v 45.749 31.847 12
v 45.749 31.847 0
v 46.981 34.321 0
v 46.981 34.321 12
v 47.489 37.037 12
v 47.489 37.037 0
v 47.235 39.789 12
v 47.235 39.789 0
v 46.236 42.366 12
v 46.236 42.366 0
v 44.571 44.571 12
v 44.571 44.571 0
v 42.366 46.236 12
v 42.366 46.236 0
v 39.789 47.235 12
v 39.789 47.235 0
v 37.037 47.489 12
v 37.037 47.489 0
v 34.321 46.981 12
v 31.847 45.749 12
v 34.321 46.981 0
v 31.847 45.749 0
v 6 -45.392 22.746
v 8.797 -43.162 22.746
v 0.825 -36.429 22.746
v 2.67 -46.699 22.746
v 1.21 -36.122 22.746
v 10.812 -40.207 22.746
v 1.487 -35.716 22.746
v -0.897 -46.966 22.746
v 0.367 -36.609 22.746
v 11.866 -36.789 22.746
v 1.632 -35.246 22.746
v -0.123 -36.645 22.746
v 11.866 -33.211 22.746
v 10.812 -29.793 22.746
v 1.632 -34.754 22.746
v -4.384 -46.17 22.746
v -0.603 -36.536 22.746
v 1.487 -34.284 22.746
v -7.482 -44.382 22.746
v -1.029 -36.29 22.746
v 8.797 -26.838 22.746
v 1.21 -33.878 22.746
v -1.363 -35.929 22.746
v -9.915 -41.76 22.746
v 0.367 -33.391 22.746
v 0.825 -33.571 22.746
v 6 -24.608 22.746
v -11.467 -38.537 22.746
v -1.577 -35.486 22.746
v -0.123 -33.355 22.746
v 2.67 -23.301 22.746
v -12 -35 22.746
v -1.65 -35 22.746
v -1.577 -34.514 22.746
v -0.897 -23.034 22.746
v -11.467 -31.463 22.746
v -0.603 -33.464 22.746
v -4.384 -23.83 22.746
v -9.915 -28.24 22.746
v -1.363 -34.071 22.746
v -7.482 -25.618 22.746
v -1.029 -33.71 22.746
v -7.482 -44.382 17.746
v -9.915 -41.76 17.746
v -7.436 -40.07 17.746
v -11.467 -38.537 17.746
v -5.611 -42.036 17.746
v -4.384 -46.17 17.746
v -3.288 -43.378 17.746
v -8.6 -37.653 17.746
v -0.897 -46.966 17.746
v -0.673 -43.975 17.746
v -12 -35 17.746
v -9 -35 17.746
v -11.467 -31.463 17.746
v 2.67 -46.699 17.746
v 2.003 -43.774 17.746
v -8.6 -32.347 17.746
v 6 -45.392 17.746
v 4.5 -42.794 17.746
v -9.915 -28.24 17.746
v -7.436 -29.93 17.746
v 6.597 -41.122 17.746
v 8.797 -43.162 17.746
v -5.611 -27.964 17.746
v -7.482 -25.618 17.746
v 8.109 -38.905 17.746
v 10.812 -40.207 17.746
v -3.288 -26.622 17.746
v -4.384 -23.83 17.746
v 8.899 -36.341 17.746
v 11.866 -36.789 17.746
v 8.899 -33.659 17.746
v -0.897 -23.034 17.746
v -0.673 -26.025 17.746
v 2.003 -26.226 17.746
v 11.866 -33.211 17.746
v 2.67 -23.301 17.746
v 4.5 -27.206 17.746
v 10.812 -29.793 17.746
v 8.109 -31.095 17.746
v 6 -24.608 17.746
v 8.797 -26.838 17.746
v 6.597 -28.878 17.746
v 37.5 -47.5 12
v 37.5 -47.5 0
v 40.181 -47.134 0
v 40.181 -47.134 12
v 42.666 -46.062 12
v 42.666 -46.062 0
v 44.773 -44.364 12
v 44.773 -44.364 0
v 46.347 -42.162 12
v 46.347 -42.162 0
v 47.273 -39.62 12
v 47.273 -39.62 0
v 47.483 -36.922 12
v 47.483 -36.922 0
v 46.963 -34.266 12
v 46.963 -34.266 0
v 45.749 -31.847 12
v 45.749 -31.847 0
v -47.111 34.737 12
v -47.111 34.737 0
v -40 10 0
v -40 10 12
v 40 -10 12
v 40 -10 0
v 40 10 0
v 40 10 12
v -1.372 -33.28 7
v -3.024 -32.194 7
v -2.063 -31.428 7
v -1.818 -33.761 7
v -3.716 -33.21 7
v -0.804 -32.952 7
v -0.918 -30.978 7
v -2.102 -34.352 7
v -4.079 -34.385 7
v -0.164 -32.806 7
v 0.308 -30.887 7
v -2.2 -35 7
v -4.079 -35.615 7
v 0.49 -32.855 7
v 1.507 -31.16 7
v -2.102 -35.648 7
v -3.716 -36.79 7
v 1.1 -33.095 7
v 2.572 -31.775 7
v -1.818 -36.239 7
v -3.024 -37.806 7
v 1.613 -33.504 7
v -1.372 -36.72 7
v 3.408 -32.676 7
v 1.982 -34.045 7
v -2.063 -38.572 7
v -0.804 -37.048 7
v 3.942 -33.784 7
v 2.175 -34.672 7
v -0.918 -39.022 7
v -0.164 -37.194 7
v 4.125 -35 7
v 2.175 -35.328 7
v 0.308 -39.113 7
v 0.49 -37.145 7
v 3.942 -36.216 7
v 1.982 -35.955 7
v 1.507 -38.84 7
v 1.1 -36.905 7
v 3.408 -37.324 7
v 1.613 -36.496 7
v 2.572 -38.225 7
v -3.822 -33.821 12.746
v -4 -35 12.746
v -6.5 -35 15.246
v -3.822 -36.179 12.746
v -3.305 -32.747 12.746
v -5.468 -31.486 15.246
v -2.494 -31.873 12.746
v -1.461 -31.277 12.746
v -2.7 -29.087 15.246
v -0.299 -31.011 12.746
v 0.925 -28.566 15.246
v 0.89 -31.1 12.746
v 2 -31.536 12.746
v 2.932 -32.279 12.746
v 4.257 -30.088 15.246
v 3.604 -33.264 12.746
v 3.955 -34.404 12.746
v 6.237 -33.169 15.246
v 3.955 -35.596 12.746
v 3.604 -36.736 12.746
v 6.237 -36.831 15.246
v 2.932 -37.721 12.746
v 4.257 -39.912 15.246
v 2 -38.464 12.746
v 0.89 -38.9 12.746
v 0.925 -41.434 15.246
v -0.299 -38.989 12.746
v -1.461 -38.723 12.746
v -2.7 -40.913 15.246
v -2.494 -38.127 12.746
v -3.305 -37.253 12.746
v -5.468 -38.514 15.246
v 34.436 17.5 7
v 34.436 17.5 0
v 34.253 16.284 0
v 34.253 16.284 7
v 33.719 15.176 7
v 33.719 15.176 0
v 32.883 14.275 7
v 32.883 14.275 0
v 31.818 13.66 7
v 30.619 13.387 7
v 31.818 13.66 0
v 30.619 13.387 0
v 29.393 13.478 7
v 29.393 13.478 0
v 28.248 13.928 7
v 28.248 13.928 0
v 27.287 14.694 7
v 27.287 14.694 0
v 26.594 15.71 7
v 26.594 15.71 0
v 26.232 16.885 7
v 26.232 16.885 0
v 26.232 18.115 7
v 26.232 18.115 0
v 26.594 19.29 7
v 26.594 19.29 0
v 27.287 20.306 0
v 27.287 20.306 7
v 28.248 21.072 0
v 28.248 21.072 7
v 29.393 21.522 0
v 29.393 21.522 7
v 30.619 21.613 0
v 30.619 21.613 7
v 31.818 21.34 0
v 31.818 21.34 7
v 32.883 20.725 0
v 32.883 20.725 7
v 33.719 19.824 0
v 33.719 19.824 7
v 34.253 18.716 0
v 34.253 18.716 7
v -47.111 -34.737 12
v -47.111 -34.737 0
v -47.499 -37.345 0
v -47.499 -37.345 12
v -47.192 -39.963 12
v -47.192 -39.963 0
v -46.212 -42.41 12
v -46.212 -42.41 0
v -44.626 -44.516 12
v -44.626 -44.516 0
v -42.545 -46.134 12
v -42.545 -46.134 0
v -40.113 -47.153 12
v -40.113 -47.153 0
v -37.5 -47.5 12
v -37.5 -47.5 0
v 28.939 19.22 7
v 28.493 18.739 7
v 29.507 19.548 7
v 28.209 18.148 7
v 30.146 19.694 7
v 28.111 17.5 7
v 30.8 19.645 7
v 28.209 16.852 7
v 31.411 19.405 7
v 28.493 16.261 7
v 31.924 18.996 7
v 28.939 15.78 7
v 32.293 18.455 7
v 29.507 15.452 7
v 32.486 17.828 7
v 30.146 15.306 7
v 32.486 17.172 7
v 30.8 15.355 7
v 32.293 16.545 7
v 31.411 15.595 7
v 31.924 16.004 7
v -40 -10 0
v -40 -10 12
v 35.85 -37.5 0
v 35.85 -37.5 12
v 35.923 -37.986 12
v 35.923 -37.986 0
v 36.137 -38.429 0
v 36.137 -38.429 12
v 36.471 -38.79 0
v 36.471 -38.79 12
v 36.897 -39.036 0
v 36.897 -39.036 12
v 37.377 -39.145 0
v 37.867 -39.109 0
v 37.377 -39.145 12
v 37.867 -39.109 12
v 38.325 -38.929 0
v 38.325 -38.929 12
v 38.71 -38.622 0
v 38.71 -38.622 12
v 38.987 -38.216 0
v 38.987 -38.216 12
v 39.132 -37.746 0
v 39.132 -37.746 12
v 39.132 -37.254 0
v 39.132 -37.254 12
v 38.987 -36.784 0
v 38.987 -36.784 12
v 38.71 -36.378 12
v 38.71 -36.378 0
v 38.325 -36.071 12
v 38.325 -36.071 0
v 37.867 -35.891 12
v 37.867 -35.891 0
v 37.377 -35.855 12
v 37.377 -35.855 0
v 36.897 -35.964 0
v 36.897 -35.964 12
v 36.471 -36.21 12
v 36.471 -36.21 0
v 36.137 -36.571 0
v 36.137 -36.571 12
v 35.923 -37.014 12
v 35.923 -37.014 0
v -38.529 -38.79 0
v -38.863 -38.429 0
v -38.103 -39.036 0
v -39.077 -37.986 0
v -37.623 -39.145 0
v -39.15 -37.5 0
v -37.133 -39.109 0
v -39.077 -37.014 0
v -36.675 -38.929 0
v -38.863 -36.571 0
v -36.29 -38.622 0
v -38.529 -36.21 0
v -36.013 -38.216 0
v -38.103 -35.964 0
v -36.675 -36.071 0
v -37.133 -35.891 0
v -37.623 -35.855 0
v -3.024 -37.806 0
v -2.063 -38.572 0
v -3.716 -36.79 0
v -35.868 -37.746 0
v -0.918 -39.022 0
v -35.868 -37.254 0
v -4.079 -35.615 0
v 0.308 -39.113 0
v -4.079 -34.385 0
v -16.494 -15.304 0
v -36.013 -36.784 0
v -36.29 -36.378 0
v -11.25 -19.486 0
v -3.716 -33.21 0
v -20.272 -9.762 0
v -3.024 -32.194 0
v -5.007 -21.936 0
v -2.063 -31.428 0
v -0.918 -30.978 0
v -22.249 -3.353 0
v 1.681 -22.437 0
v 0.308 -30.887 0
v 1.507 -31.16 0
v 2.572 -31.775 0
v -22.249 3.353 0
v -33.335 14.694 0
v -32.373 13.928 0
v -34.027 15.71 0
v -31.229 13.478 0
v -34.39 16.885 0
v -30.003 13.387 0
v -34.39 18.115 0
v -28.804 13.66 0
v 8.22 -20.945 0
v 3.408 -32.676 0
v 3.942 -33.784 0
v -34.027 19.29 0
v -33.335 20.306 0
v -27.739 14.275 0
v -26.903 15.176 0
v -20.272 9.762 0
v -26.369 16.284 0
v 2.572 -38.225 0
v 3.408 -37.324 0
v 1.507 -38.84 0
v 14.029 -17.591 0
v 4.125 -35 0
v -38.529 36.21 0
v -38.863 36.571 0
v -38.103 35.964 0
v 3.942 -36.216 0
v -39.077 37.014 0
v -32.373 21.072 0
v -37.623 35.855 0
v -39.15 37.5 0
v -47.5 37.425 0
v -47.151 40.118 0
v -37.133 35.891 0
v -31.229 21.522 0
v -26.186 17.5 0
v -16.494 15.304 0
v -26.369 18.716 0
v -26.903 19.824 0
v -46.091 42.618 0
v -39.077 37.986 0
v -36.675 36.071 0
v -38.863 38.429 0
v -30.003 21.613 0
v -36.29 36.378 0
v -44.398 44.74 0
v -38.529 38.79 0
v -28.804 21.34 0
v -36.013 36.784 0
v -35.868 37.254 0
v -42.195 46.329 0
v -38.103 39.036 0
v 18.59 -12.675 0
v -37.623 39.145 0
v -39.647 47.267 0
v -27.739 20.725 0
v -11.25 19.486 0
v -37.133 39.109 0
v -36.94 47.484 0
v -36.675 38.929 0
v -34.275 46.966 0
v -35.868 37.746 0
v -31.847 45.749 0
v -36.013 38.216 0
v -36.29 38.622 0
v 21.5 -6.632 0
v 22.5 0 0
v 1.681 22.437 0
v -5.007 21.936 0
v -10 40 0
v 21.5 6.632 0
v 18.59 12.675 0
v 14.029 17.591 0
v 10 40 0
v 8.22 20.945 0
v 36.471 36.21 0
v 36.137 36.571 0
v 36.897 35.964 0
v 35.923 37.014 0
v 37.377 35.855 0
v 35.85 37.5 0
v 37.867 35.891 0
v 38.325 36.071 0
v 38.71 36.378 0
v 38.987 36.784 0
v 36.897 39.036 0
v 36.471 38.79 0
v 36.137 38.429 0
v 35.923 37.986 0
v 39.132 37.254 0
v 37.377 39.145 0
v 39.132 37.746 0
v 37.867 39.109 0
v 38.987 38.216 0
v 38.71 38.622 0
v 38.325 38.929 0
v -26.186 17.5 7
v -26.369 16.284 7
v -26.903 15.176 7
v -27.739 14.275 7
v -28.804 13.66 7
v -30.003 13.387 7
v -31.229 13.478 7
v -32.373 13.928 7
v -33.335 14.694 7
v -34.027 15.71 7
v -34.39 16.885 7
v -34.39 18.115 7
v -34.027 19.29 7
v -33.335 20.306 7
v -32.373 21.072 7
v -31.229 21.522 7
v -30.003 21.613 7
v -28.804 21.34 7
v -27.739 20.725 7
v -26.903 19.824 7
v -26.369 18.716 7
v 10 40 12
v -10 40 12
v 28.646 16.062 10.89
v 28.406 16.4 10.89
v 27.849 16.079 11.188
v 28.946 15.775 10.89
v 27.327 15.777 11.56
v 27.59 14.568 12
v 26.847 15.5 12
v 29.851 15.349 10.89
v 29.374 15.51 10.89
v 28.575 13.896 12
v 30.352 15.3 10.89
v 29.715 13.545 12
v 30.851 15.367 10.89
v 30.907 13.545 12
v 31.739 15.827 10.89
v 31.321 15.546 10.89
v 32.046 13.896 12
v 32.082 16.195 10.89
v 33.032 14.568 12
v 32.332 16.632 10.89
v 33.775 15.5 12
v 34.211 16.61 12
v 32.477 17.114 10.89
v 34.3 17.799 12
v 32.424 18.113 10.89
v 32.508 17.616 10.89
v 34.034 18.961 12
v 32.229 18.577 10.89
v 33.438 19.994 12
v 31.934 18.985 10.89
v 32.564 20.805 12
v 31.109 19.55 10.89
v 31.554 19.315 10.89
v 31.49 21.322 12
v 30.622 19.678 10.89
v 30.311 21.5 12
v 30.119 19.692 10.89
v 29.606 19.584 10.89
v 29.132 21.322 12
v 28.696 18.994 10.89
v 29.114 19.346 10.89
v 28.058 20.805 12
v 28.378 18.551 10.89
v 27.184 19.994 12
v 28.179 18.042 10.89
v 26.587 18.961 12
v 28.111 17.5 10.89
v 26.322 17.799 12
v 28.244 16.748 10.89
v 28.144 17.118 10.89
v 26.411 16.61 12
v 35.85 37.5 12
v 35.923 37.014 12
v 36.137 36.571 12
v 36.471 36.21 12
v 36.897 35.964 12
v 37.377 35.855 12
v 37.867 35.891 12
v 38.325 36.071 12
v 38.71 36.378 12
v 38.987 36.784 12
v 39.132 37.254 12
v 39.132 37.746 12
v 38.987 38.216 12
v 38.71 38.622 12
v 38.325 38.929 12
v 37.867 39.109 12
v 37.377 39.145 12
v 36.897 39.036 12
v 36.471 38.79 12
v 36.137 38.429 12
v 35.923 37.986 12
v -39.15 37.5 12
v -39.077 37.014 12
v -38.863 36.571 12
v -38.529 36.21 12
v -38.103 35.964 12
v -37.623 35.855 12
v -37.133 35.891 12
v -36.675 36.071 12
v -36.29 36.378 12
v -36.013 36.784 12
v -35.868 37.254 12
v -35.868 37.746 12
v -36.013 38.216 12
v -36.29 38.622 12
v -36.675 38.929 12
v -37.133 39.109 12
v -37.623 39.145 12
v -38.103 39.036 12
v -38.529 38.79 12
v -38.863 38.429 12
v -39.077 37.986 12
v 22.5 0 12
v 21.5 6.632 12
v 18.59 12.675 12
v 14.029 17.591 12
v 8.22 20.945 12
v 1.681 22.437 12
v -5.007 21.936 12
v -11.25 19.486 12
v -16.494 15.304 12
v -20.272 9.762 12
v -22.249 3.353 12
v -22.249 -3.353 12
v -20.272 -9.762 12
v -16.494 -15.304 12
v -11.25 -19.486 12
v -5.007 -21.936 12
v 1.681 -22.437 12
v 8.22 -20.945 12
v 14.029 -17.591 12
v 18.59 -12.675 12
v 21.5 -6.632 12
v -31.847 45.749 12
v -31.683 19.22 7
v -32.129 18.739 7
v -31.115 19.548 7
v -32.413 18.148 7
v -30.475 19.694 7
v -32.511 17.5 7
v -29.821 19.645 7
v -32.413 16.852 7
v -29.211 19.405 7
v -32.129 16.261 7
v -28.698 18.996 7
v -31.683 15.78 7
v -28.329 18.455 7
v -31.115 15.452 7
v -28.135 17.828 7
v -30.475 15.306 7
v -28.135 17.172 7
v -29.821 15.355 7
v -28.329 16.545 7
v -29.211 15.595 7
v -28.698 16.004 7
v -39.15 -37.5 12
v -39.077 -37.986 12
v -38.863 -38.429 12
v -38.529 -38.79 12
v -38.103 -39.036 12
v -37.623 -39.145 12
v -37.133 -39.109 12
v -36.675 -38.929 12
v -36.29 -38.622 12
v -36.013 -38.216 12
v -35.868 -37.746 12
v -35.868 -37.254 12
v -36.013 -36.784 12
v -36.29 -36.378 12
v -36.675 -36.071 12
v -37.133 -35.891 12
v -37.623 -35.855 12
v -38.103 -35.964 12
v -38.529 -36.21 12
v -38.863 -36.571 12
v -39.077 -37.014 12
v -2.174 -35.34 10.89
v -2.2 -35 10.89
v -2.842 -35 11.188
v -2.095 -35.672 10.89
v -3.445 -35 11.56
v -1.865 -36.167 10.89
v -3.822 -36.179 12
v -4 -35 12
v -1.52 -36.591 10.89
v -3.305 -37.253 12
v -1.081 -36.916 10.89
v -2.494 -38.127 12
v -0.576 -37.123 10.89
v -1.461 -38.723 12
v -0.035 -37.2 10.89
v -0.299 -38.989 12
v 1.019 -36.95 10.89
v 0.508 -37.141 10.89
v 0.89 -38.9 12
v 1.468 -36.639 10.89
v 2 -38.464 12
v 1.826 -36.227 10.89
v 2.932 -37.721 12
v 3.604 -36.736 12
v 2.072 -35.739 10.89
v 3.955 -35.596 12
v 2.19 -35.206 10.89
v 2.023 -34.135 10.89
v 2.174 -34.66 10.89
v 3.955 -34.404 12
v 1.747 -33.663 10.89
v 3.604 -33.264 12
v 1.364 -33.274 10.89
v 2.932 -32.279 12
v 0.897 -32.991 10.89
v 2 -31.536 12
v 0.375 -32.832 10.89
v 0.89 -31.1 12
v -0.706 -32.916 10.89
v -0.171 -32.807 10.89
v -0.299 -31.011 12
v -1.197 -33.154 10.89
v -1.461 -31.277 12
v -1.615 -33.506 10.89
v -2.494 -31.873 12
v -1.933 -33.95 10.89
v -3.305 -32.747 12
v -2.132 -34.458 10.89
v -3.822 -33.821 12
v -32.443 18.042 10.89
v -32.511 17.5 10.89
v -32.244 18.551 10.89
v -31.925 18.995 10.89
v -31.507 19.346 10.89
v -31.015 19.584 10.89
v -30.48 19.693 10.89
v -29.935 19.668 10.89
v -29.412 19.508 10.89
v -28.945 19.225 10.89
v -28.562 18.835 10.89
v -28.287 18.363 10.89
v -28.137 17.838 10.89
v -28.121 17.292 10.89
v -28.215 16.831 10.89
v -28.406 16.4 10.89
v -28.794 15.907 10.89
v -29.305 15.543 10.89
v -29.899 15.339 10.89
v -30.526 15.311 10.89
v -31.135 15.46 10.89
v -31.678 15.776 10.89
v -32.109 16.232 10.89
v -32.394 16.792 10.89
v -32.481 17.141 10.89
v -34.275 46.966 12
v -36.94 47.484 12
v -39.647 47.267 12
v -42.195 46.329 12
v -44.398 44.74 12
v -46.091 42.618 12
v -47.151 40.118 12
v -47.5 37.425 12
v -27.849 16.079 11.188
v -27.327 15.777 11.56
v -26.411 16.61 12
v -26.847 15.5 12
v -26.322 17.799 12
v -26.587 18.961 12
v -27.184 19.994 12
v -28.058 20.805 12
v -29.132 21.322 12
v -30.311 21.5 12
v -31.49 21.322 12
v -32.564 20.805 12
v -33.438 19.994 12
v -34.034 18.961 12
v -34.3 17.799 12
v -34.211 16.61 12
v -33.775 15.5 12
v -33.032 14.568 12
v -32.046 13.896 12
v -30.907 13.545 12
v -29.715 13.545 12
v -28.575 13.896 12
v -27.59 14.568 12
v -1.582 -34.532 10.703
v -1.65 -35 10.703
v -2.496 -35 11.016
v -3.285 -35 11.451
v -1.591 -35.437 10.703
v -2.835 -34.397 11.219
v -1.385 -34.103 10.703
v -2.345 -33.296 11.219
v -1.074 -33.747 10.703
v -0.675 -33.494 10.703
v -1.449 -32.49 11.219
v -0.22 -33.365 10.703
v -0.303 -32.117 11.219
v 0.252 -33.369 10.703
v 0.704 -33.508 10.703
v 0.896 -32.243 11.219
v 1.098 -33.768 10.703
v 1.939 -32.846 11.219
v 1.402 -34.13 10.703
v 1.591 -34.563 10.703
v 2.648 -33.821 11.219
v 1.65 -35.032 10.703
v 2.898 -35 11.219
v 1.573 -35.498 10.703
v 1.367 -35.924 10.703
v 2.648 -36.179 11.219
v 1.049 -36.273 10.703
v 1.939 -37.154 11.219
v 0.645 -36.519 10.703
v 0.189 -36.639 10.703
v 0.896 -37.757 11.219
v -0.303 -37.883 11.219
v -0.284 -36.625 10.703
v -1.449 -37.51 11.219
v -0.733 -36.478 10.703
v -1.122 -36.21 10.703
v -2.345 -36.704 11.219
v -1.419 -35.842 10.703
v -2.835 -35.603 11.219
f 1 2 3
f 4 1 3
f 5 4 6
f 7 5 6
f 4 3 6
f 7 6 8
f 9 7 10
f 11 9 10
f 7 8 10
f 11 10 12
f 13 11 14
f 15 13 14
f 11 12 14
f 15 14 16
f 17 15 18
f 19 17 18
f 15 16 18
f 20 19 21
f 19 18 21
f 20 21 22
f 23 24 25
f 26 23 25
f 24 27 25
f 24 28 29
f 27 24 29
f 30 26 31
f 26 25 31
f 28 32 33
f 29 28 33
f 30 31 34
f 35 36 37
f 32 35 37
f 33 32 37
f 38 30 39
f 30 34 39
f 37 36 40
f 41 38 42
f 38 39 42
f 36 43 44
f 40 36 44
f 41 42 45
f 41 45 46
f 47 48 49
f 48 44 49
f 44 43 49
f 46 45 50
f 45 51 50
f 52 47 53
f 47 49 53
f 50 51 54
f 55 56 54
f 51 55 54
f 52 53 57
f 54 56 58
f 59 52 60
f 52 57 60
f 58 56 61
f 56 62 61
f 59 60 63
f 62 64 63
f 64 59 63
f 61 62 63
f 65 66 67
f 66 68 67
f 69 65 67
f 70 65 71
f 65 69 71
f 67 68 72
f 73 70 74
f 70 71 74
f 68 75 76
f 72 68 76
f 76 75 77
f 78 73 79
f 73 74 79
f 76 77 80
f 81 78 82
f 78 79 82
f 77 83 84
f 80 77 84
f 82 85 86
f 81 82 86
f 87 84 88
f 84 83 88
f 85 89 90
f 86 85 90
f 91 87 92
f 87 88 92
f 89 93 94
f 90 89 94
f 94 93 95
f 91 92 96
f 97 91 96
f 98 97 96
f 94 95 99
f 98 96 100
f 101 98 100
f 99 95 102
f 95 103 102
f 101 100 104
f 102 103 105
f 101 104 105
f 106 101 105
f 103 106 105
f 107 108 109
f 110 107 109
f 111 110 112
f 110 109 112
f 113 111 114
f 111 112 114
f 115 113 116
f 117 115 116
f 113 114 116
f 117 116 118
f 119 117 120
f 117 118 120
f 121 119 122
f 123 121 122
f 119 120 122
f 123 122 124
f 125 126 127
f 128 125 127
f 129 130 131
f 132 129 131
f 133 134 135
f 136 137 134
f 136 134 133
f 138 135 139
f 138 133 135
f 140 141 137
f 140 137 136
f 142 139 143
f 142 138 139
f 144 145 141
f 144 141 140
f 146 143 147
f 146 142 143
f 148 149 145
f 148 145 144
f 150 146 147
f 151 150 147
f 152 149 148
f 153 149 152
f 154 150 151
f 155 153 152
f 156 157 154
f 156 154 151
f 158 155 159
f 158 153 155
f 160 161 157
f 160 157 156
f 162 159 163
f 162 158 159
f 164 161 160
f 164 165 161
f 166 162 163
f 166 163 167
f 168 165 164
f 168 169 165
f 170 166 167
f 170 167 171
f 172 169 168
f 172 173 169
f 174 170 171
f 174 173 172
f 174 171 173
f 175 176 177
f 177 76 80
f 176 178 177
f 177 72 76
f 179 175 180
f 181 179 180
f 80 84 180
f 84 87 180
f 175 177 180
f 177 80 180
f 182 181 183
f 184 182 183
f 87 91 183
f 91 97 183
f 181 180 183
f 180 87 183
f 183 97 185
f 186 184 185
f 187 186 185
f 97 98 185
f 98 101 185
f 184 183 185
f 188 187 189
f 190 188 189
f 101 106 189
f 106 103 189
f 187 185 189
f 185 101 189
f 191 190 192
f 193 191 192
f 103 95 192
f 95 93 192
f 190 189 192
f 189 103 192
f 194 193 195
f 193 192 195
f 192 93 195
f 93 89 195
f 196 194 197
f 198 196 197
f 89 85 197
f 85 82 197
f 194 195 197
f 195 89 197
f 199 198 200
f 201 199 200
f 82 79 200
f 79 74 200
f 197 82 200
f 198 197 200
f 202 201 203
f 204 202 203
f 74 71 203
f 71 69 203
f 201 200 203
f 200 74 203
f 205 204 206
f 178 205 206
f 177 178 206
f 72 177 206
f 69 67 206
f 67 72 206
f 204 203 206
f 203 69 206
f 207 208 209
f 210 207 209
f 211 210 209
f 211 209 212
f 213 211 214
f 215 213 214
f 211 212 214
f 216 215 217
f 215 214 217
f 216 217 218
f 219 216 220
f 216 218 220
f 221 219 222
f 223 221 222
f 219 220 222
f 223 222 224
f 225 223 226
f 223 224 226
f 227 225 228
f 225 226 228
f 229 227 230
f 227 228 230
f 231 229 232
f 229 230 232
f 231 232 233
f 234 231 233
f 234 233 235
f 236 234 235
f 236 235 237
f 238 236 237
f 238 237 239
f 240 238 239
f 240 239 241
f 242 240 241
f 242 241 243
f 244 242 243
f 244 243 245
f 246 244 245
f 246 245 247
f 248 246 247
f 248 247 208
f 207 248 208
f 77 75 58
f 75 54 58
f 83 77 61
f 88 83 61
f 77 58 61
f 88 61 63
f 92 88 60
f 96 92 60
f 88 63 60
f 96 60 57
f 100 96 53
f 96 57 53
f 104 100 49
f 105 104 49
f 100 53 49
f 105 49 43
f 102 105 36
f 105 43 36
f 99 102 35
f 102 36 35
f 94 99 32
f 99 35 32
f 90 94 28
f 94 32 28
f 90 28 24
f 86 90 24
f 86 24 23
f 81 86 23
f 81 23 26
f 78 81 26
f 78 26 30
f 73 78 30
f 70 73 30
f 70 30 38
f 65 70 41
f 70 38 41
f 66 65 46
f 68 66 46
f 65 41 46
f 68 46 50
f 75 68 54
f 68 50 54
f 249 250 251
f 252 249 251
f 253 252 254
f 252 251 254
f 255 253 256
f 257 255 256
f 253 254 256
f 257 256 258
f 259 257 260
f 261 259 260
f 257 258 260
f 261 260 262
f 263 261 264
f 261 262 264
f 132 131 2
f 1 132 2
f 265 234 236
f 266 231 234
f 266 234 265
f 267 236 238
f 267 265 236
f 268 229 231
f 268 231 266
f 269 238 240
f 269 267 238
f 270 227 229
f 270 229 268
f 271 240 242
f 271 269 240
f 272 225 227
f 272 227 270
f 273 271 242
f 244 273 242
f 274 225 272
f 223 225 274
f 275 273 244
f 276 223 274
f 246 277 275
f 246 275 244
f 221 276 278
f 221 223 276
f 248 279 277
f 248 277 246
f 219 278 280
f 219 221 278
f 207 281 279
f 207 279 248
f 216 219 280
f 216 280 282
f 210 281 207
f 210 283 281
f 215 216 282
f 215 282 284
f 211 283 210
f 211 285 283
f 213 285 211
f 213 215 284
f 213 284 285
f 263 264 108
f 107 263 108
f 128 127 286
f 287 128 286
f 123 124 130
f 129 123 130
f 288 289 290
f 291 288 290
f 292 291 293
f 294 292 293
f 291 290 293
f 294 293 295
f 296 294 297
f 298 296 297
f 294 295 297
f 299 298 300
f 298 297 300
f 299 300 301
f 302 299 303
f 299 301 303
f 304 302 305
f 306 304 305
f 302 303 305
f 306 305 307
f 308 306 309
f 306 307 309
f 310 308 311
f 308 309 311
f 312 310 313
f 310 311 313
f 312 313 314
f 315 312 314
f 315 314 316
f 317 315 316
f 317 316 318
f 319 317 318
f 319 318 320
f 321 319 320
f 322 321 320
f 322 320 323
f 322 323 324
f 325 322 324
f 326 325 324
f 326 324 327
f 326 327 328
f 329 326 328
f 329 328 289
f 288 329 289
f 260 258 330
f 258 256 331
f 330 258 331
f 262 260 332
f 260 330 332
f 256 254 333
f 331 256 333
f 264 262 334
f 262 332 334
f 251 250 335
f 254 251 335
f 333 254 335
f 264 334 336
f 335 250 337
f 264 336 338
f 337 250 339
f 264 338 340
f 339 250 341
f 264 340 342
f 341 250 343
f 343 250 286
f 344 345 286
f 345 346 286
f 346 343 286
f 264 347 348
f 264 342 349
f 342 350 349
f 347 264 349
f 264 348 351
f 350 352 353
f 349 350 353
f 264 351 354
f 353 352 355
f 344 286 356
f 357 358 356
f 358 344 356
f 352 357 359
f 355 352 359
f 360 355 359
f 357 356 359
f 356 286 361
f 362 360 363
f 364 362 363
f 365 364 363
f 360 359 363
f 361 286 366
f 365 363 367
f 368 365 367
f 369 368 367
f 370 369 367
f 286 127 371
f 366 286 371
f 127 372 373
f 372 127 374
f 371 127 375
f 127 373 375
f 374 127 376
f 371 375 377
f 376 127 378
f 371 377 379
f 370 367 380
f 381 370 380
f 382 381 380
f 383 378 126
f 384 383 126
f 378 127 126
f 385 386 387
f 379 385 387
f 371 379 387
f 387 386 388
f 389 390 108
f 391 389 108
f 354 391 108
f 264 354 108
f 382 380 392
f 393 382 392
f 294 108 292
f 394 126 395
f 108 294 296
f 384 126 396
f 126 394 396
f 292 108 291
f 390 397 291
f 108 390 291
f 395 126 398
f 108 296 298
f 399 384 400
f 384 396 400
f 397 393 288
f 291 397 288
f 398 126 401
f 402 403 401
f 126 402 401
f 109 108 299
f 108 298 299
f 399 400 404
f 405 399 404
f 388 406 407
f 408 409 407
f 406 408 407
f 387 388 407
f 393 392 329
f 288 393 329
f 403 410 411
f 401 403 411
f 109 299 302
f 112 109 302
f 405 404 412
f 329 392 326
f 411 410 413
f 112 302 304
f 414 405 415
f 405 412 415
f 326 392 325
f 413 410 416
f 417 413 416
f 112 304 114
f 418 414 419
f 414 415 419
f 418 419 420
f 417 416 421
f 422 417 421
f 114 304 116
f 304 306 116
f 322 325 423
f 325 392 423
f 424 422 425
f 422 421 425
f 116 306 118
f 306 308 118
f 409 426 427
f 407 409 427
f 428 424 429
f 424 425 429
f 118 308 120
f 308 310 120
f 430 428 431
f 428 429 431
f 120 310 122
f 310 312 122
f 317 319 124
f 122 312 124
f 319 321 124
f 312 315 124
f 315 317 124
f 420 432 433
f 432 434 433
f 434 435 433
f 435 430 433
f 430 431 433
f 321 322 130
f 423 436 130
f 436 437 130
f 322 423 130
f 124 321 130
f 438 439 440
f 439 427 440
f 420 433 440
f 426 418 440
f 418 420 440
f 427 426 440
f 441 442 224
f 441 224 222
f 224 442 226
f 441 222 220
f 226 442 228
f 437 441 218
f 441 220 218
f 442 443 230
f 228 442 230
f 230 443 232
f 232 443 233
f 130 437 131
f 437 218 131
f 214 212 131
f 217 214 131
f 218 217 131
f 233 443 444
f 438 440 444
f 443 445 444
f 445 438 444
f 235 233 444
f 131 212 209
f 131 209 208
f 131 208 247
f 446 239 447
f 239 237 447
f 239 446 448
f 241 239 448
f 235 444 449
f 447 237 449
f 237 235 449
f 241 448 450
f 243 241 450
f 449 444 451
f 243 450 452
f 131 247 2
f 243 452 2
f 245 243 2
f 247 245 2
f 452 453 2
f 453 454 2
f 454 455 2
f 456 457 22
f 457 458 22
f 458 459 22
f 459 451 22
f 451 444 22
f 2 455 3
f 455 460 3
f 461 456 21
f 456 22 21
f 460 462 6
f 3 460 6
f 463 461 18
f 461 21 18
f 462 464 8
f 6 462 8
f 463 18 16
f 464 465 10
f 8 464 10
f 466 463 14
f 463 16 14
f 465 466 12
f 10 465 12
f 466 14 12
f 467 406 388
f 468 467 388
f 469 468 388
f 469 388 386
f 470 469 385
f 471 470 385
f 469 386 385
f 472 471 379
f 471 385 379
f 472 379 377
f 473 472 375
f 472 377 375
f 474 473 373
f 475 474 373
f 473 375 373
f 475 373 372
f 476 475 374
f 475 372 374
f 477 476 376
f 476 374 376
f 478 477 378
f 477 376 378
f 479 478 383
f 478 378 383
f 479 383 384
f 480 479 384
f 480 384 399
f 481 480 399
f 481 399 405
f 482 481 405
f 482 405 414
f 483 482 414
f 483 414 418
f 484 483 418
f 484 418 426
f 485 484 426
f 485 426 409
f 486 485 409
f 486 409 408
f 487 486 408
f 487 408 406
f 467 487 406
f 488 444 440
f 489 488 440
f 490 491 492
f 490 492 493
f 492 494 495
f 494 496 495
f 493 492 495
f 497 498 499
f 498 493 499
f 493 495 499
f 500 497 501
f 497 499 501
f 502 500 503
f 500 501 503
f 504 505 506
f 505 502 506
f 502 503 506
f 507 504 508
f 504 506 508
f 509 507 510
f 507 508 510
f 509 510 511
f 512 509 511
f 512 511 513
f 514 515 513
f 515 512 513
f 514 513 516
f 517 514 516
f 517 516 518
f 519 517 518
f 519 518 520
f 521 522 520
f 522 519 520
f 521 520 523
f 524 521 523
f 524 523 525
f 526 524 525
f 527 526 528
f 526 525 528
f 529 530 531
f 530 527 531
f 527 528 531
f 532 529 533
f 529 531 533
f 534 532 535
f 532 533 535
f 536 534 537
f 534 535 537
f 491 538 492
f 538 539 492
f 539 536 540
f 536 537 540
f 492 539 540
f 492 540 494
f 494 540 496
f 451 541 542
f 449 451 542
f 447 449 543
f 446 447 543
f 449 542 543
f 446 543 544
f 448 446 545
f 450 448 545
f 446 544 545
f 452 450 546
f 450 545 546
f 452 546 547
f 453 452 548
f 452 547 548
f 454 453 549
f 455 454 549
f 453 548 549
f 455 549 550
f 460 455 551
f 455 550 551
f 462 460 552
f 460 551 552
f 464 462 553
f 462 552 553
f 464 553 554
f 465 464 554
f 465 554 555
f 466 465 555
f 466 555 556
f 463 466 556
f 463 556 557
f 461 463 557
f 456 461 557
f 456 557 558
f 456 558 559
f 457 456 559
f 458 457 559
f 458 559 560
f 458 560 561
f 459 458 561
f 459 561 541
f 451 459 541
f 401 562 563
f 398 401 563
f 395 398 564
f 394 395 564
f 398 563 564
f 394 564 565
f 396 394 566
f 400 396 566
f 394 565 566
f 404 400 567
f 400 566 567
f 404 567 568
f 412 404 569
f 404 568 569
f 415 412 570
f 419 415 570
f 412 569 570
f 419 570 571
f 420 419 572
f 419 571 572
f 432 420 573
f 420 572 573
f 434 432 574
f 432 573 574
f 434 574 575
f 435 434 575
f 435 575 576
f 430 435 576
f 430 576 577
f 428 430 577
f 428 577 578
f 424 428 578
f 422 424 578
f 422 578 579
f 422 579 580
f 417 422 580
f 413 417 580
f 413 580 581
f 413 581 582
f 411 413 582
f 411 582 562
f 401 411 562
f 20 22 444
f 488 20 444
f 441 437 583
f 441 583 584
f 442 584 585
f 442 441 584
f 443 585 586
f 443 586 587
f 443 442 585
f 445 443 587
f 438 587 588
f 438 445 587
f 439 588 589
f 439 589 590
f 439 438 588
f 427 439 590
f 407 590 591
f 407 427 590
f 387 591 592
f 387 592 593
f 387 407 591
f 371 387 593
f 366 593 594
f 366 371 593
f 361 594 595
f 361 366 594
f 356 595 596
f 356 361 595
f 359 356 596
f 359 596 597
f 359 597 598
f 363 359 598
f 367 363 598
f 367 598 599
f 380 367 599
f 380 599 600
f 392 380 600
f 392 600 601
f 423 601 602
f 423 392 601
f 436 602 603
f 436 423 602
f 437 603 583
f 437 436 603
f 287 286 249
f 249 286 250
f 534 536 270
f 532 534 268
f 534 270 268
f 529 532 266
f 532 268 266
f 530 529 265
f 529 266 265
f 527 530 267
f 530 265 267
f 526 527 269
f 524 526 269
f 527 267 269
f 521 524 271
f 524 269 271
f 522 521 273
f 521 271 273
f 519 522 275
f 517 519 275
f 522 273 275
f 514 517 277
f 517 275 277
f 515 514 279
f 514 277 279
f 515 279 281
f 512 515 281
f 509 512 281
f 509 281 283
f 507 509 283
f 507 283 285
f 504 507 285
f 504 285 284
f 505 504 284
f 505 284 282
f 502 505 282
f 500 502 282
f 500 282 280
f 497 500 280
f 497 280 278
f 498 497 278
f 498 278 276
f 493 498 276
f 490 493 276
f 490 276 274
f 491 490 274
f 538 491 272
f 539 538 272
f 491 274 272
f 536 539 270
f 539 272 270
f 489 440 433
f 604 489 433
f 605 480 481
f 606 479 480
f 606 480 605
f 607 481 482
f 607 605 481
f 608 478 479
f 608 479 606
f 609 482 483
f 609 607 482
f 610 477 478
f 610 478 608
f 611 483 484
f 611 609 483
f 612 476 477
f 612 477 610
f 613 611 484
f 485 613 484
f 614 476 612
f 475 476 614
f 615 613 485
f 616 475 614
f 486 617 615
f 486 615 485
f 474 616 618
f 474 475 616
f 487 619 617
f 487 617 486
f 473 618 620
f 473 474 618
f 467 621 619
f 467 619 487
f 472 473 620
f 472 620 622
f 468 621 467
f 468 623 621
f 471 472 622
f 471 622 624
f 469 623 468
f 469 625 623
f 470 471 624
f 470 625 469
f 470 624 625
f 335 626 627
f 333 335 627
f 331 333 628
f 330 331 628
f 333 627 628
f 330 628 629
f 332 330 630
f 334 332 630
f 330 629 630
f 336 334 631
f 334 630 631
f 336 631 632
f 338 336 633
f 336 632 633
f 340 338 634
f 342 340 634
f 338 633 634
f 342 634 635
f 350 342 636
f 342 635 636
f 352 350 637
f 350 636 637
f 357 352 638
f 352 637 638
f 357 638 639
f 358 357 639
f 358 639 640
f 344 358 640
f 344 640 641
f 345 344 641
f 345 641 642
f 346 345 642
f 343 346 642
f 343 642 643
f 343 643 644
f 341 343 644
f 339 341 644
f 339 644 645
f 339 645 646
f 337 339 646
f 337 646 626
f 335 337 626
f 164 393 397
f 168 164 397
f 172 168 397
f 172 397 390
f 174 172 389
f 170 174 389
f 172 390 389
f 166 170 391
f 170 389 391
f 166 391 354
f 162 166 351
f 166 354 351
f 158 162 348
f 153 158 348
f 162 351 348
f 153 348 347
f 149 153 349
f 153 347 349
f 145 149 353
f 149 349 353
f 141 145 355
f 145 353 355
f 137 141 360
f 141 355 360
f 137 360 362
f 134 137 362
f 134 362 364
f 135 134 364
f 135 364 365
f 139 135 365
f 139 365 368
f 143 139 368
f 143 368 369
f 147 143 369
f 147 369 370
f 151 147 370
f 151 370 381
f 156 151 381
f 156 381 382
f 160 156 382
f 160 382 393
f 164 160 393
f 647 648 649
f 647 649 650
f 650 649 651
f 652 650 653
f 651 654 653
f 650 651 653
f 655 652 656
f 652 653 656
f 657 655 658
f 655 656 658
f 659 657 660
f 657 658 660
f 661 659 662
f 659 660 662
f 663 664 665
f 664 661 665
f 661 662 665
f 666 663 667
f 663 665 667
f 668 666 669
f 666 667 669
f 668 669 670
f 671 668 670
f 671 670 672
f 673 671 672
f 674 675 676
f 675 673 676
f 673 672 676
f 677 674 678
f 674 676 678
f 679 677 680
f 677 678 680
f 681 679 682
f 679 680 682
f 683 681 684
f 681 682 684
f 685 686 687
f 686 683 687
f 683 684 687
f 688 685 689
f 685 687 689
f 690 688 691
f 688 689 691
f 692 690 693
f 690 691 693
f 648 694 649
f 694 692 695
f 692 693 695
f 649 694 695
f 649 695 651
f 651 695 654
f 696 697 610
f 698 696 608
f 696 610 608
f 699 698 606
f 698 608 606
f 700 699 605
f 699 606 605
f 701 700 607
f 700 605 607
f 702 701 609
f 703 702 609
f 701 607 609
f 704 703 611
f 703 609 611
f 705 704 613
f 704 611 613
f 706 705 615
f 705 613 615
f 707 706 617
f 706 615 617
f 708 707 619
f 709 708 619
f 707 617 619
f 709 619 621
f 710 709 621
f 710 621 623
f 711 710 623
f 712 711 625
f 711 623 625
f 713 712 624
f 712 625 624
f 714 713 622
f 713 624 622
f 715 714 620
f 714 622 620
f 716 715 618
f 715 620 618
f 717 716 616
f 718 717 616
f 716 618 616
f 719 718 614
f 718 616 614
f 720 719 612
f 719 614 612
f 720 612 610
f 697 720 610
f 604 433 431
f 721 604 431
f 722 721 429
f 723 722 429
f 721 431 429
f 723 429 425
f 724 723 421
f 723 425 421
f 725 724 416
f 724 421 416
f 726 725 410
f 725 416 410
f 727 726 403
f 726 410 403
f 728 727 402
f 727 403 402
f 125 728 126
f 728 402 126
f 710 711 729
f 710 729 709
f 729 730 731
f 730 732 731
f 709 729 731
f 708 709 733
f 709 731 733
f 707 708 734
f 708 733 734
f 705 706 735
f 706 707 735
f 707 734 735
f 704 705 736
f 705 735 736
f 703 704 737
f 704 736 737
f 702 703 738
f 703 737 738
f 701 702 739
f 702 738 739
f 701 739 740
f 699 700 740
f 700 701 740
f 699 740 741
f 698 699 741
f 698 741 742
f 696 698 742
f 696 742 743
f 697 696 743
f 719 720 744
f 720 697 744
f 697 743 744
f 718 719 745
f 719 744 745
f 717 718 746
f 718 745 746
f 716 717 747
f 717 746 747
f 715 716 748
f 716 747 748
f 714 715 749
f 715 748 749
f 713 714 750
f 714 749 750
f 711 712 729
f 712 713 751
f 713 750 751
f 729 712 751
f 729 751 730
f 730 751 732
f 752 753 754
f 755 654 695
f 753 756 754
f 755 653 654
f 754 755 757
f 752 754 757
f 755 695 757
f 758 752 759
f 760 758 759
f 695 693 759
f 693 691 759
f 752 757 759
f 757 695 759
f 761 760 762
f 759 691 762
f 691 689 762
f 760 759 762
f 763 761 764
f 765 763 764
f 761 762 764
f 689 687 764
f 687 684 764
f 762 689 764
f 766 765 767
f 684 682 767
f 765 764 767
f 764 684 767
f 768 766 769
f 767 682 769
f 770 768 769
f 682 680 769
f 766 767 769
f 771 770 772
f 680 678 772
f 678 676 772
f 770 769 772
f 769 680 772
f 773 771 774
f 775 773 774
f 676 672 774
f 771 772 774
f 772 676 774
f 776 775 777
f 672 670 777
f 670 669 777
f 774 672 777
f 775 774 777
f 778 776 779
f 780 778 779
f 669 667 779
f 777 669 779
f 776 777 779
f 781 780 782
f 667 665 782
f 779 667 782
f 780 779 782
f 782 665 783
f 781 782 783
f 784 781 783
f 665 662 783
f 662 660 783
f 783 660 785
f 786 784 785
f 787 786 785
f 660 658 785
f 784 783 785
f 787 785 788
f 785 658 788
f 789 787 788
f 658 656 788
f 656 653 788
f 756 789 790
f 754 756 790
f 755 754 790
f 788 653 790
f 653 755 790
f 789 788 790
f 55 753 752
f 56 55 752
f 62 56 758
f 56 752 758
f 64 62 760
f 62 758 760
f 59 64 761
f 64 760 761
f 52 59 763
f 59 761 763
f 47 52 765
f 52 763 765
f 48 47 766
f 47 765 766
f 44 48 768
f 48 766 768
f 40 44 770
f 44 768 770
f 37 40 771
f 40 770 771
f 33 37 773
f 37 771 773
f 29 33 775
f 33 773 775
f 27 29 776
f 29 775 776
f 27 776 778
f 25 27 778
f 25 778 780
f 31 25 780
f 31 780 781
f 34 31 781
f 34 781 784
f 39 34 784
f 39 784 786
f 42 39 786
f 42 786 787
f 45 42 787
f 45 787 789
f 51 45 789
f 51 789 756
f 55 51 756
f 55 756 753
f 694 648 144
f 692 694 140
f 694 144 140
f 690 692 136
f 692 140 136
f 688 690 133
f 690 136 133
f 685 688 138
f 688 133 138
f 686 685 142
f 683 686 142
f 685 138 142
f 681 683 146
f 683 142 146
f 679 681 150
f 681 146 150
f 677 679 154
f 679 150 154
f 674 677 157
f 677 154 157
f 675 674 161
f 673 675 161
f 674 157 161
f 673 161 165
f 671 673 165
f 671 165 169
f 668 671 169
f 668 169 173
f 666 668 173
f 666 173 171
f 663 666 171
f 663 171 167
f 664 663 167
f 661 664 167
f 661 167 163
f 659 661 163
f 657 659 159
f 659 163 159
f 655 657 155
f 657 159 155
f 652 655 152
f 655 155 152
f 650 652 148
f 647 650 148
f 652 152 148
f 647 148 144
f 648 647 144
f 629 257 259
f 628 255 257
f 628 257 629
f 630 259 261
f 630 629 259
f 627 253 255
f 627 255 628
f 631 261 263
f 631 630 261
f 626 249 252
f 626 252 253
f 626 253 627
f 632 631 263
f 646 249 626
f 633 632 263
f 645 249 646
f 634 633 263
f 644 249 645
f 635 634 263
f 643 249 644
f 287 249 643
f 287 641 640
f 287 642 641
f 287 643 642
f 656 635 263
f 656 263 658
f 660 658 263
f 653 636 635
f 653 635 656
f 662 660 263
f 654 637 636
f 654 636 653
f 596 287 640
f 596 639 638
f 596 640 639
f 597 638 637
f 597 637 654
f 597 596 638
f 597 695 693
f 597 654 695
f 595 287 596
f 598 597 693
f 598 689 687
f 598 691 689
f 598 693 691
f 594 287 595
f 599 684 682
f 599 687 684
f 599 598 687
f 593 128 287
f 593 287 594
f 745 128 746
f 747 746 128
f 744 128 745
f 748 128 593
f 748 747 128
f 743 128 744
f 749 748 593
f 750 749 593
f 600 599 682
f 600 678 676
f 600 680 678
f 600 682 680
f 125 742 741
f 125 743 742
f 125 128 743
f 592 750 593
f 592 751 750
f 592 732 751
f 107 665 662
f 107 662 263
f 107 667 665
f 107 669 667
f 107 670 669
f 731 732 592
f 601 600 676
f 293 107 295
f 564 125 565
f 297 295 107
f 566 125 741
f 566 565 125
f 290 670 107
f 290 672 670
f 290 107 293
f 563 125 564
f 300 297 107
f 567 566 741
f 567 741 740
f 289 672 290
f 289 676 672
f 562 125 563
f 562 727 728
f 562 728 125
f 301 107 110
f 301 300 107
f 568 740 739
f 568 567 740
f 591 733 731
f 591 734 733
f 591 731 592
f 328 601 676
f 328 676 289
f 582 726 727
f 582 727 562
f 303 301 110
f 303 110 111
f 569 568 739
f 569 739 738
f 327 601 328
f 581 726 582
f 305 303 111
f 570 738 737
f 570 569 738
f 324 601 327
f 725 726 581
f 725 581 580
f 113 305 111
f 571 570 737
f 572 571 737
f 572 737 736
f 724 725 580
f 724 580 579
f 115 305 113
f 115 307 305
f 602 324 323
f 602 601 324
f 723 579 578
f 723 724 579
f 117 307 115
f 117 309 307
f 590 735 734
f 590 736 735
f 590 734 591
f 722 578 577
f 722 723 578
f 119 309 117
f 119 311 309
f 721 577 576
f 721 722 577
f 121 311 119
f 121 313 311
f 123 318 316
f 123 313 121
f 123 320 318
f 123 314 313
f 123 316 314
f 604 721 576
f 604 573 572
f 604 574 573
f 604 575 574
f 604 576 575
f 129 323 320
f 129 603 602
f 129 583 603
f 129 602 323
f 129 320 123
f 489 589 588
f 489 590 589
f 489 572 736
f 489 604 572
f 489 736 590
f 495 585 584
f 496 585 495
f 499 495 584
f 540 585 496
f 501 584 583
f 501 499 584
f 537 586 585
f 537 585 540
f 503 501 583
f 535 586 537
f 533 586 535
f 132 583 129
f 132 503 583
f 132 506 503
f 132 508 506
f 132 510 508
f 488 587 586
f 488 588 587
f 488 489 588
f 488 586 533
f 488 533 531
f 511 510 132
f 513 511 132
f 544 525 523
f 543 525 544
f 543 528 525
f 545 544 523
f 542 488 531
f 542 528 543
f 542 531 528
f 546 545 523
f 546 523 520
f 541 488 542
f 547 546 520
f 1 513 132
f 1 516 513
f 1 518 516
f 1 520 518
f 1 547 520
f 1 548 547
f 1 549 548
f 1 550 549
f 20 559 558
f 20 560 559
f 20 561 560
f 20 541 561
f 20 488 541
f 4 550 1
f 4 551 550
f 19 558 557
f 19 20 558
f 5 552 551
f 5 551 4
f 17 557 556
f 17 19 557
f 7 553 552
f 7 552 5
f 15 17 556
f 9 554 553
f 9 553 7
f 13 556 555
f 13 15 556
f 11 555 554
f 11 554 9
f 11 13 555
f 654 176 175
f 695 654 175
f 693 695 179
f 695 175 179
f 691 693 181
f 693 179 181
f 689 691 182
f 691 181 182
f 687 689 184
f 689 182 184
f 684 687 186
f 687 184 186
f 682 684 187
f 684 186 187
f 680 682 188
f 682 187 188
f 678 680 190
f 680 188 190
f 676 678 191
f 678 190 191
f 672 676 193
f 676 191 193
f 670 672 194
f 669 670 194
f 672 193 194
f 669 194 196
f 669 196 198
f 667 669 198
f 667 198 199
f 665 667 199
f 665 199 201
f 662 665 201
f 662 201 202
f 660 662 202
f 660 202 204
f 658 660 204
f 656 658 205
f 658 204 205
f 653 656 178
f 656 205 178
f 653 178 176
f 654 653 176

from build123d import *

# Parameters (mm, degrees)
F1_DEPTH        = 12
F15_D           = 3.3
F16_D           = 4.4
F18_D           = 4.4
F18_DEPTH       = 7.1
F18_CBORE_D     = 8.25
F18_CBORE_DEPTH = 7
F18_TIP         = 1.3218933619
F19_D           = 3.3
F20_R           = 22.5
F21_DEPTH       = 12
F22_SIZE        = 5


with BuildPart() as f1:
    # F0 (on Top) → F1 (new body)
    with BuildSketch(Plane.XY):
        with BuildLine():
            Line((-10, 40), (-31.8472735229, 45.749041361))
            ThreePointArc((-31.8472735229, 45.749041361), (-43.3507237994, 45.6098107884), (-47.1108140615, 34.7373467329))
            Line((-47.1108140615, 34.7373467329), (-40, 10))
            Line((-40, 10), (-40, -10))
            Line((-40, -10), (-47.1108140615, -34.7373467329))
            ThreePointArc((-47.1108140615, -34.7373467329), (-45.4883206205, -43.5155410118), (-37.5, -47.5))
            Line((-37.5, -47.5), (37.5, -47.5))
            ThreePointArc((37.5, -47.5), (46.3466735209, -42.1622277523), (45.749041361, -31.8472735229))
            Line((45.749041361, -31.8472735229), (40, -10))
            Line((40, -10), (40, 10))
            Line((40, 10), (45.749041361, 31.8472735229))
            ThreePointArc((45.749041361, 31.8472735229), (44.5710678119, 44.5710678119), (31.8472735229, 45.749041361))
            Line((31.8472735229, 45.749041361), (10, 40))
            Line((10, 40), (-10, 40))
        make_face()
    extrude(amount=F1_DEPTH)

    # F4 (on plane+point) → F7 (revolve, cut)
    with BuildSketch(Plane(origin=(0, -35, 0), x_dir=(-1, 0, 0), z_dir=(0, 1, 0))):
        with BuildLine():
            ThreePointArc((0, 10.472135955), (2.1409325386, 10.8671018012), (4, 12))
            Line((4, 12), (0, 12))
            Line((0, 12), (0, 10.472135955))
        make_face()
    revolve(axis=Axis((0, -35, 26.2402286232), (0, 0, 1)), mode=Mode.SUBTRACT)

    # F6 (on line) → F8 (revolve, cut)
    with BuildSketch(Plane(origin=(0, 0, 0), x_dir=(0.8660254038, -0.5, 0), z_dir=(-0.5, -0.8660254038, 0))):
        with BuildLine():
            ThreePointArc((-35, 10.472135955), (-32.8590674614, 10.8671018012), (-31, 12))
            Line((-31, 12), (-35, 12))
            Line((-35, 12), (-35, 10.472135955))
        make_face()
    revolve(axis=Axis((-30.3108891325, 17.5, 26.2402286232), (0, 0, 1)), mode=Mode.SUBTRACT)

    # F10 (on line) → F11 (revolve, cut)
    with BuildSketch(Plane(origin=(0, 0, 0), x_dir=(-0.8660254038, -0.5, 0), z_dir=(-0.5, 0.8660254038, 0))):
        with BuildLine():
            ThreePointArc((-35, 10.472135955), (-32.8590674614, 10.8671018012), (-31, 12))
            Line((-31, 12), (-35, 12))
            Line((-35, 12), (-35, 10.472135955))
        make_face()
    revolve(axis=Axis((30.3108891325, 17.5, 26.2402286232), (0, 0, 1)), mode=Mode.SUBTRACT)

    # F16 (through all)
    with Locations(Plane.XY.offset(12)):
        with Locations((30.3108891325, 17.5), (-30.3108891325, 17.5), (0, -35)):
            Hole(F16_D / 2)

    # F18
    with Locations(Plane(origin=(0, 0, 0), x_dir=(1, 0, 0), z_dir=(0, 0, -1))):
        with Locations((-30.3108891325, -17.5), (0, 35), (30.3108891325, -17.5)):
            CounterBoreHole(F18_D / 2, F18_CBORE_D / 2, F18_CBORE_DEPTH, depth=F18_DEPTH)
            with Locations((0, 0, -(F18_DEPTH + F18_TIP / 2))):  # 118° drill point
                Cone(0, F18_D / 2, F18_TIP, mode=Mode.SUBTRACT)

    # F19 (through all)
    with Locations(Plane(origin=(0, 0, 0), x_dir=(1, 0, 0), z_dir=(0, 0, -1))):
        with Locations((-37.5, -37.5), (-37.5, 37.5), (37.5, 37.5), (37.5, -37.5)):
            Hole(F19_D / 2)

    # F20 (on face) → F21 (cut, through all)
    with BuildSketch(Plane.XY):
        Circle(F20_R)
    extrude(amount=F21_DEPTH, mode=Mode.SUBTRACT)


with BuildPart() as f13:
    # F12 (on plane+point) → F13 (revolve)
    with BuildSketch(Plane(origin=(0, -35, 0), x_dir=(-1, 0, 0), z_dir=(0, 1, 0))):
        with BuildLine():
            Line((0, 12), (0, 10.472135955))
            ThreePointArc((0, 10.472135955), (2.1409325386, 10.8671018012), (4, 12))
            Line((4, 12), (4, 17.7461159229))
            Line((4, 17.7461159229), (12, 17.7461159229))
            Line((12, 17.7461159229), (12, 22.7461159229))
            Line((12, 22.7461159229), (0, 22.7461159229))
            Line((0, 22.7461159229), (0, 16.472135955))
            Line((0, 16.472135955), (0, 12))
        make_face()
    revolve(axis=Axis((0, -35, 19.609125939), (0, 0, -1)))

    # F15 (through all)
    with Locations(Plane.XY.offset(22.7461159229)):
        with Locations((0, -35)):
            Hole(F15_D / 2)

    # F22
    f22_edges = [f13.edges().sort_by_distance(p)[0] for p in [
        (4, -35, 17.746116),
    ]]
    chamfer(f22_edges, length=F22_SIZE)


solid = Compound([f1.part, f13.part])
